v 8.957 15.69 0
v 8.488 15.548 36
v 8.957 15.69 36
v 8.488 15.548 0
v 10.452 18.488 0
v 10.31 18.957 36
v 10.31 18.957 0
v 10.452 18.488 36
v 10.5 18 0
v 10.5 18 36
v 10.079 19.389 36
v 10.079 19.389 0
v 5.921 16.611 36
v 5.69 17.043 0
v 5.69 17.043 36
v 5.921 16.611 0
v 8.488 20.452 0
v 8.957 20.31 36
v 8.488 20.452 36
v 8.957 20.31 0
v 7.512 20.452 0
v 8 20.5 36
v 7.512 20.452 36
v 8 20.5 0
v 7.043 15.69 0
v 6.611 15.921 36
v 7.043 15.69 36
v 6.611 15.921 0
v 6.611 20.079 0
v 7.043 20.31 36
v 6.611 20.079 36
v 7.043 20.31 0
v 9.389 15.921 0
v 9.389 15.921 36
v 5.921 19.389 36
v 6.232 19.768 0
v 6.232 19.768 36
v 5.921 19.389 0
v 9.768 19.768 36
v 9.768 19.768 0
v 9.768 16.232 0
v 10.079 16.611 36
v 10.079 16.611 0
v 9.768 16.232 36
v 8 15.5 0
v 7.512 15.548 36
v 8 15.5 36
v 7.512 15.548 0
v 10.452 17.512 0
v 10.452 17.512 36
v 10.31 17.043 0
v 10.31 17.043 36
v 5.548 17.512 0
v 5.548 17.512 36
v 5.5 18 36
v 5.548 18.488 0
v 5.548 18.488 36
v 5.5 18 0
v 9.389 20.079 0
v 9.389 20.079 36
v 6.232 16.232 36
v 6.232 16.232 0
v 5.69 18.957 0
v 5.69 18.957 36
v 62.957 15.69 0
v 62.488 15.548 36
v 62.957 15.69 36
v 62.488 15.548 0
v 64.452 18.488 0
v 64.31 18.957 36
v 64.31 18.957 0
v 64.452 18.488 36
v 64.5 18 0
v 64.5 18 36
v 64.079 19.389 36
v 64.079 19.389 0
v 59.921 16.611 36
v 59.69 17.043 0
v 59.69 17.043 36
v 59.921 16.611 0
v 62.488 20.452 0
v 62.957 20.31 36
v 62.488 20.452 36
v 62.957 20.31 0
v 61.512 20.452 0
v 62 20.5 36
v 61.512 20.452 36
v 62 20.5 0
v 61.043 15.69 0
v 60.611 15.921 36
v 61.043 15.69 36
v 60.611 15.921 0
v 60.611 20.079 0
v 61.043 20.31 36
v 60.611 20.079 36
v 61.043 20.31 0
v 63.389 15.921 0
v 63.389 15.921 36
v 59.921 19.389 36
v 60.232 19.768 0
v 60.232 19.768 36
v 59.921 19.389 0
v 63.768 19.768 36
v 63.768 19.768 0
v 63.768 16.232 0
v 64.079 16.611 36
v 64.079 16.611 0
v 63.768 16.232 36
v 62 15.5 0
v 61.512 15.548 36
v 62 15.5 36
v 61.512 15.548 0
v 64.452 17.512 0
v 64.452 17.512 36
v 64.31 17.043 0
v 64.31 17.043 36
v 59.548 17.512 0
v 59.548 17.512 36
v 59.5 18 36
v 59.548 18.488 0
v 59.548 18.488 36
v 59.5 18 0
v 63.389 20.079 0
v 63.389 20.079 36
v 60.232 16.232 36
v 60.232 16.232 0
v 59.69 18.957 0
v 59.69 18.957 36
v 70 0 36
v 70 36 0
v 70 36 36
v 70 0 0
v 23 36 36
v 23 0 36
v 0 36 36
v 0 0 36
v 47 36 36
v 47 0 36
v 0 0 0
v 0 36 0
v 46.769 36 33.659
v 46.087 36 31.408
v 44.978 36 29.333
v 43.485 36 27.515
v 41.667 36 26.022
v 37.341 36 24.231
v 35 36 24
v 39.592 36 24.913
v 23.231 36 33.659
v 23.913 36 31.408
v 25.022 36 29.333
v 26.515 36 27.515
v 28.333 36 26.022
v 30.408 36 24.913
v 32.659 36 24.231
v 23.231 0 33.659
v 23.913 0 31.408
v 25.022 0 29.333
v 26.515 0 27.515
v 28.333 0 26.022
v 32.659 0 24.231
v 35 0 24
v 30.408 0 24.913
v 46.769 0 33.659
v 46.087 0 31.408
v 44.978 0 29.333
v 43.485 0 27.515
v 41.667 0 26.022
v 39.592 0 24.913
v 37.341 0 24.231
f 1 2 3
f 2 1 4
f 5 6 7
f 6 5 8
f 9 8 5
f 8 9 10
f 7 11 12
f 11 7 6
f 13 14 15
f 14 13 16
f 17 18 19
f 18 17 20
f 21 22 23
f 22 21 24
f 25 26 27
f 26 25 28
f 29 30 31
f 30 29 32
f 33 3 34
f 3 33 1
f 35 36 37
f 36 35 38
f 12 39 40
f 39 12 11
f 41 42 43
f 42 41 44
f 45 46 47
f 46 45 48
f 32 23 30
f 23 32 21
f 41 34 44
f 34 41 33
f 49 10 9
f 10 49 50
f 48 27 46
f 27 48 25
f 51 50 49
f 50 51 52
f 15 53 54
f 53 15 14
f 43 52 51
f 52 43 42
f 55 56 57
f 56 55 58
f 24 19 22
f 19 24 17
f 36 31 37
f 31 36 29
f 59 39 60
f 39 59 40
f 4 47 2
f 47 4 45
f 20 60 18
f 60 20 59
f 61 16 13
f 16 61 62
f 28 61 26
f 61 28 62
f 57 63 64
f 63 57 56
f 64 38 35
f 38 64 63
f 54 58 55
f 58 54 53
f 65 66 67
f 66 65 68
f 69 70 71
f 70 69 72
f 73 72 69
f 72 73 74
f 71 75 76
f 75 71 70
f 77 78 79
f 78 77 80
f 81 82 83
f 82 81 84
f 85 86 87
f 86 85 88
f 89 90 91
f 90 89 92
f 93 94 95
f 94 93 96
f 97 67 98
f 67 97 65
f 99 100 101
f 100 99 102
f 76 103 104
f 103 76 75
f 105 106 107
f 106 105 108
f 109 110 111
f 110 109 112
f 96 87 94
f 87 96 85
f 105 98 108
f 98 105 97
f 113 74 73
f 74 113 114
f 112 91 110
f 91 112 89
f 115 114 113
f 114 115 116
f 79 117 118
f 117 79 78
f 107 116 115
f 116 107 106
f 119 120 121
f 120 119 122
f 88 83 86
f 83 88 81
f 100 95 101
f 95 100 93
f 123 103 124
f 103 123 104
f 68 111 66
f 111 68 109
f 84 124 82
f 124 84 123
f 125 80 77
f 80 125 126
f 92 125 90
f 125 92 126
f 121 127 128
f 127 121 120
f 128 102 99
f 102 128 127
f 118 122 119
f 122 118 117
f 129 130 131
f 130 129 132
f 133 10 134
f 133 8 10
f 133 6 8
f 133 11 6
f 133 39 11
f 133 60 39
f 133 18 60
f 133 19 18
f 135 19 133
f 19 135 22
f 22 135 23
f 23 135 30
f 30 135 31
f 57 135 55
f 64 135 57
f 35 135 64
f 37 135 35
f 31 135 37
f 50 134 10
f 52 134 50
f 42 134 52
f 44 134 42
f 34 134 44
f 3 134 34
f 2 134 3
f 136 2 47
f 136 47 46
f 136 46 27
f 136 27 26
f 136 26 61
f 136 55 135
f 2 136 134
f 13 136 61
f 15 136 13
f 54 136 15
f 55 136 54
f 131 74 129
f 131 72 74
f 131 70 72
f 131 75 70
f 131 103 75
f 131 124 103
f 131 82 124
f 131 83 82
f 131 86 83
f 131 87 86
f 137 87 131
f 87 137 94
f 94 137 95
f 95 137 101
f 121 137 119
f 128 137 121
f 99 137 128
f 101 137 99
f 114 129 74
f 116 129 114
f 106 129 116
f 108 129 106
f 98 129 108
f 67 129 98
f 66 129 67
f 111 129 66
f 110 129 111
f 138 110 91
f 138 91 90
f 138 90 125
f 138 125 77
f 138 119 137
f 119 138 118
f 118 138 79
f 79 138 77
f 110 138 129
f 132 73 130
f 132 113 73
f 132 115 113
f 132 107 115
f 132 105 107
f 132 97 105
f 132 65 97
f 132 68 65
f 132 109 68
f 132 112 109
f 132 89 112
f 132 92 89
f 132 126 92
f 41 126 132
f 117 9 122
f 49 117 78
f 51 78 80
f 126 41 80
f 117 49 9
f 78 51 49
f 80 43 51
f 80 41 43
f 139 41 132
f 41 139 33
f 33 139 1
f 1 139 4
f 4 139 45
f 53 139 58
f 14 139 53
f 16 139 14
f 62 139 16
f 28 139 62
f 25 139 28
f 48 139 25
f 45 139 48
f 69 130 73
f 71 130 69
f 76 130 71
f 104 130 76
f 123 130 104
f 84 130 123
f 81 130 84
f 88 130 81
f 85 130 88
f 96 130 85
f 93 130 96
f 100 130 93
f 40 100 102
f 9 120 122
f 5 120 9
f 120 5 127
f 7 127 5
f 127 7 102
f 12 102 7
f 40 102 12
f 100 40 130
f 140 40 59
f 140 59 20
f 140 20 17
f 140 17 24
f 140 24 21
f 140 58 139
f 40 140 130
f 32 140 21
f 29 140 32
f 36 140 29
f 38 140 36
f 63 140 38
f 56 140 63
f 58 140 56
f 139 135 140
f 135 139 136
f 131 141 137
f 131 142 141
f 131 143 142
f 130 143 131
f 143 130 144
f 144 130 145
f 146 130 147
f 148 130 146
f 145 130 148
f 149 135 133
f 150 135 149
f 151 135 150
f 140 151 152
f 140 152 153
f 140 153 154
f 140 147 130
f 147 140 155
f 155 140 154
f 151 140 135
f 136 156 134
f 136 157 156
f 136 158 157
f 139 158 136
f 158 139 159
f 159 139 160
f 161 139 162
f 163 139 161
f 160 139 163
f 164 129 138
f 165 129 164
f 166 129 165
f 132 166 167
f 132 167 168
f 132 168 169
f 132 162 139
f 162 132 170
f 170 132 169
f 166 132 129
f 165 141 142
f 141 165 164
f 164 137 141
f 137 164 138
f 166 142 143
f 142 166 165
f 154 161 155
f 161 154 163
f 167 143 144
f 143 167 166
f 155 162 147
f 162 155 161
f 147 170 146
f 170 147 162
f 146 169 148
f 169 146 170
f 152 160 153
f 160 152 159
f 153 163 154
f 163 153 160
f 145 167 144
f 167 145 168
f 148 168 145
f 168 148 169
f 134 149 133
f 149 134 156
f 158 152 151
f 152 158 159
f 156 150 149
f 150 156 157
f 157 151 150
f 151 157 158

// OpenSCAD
$fn = 32;

// ----------------------------------------------------------------------
// Saddle clamp: plain shaft clamp
// ----------------------------------------------------------------------

// --- parameters (mm) ---
blk_l = 70;               // block length, X
blk_w = 36;               // block width, Y
blk_h = 36;               // block height
clamp_r = 12;             // shaft groove radius
hole_r = 2.5;             // bolt hole radius
hole_m = 8;               // bolt hole margin from the ends

saw_depth = clamp_r + 3;  // saw kerf depth

difference() {
  cube([blk_l, blk_w, blk_h]);
  translate([blk_l / 2, -1, blk_h])
    rotate([-90, 0, 0])
      cylinder(h = blk_w + 2, r = clamp_r);
  for (sx = [0, 1])
    translate([sx ? blk_l - hole_m : hole_m, blk_w / 2, -1])
      cylinder(r = hole_r, h = blk_h + 2);
}
